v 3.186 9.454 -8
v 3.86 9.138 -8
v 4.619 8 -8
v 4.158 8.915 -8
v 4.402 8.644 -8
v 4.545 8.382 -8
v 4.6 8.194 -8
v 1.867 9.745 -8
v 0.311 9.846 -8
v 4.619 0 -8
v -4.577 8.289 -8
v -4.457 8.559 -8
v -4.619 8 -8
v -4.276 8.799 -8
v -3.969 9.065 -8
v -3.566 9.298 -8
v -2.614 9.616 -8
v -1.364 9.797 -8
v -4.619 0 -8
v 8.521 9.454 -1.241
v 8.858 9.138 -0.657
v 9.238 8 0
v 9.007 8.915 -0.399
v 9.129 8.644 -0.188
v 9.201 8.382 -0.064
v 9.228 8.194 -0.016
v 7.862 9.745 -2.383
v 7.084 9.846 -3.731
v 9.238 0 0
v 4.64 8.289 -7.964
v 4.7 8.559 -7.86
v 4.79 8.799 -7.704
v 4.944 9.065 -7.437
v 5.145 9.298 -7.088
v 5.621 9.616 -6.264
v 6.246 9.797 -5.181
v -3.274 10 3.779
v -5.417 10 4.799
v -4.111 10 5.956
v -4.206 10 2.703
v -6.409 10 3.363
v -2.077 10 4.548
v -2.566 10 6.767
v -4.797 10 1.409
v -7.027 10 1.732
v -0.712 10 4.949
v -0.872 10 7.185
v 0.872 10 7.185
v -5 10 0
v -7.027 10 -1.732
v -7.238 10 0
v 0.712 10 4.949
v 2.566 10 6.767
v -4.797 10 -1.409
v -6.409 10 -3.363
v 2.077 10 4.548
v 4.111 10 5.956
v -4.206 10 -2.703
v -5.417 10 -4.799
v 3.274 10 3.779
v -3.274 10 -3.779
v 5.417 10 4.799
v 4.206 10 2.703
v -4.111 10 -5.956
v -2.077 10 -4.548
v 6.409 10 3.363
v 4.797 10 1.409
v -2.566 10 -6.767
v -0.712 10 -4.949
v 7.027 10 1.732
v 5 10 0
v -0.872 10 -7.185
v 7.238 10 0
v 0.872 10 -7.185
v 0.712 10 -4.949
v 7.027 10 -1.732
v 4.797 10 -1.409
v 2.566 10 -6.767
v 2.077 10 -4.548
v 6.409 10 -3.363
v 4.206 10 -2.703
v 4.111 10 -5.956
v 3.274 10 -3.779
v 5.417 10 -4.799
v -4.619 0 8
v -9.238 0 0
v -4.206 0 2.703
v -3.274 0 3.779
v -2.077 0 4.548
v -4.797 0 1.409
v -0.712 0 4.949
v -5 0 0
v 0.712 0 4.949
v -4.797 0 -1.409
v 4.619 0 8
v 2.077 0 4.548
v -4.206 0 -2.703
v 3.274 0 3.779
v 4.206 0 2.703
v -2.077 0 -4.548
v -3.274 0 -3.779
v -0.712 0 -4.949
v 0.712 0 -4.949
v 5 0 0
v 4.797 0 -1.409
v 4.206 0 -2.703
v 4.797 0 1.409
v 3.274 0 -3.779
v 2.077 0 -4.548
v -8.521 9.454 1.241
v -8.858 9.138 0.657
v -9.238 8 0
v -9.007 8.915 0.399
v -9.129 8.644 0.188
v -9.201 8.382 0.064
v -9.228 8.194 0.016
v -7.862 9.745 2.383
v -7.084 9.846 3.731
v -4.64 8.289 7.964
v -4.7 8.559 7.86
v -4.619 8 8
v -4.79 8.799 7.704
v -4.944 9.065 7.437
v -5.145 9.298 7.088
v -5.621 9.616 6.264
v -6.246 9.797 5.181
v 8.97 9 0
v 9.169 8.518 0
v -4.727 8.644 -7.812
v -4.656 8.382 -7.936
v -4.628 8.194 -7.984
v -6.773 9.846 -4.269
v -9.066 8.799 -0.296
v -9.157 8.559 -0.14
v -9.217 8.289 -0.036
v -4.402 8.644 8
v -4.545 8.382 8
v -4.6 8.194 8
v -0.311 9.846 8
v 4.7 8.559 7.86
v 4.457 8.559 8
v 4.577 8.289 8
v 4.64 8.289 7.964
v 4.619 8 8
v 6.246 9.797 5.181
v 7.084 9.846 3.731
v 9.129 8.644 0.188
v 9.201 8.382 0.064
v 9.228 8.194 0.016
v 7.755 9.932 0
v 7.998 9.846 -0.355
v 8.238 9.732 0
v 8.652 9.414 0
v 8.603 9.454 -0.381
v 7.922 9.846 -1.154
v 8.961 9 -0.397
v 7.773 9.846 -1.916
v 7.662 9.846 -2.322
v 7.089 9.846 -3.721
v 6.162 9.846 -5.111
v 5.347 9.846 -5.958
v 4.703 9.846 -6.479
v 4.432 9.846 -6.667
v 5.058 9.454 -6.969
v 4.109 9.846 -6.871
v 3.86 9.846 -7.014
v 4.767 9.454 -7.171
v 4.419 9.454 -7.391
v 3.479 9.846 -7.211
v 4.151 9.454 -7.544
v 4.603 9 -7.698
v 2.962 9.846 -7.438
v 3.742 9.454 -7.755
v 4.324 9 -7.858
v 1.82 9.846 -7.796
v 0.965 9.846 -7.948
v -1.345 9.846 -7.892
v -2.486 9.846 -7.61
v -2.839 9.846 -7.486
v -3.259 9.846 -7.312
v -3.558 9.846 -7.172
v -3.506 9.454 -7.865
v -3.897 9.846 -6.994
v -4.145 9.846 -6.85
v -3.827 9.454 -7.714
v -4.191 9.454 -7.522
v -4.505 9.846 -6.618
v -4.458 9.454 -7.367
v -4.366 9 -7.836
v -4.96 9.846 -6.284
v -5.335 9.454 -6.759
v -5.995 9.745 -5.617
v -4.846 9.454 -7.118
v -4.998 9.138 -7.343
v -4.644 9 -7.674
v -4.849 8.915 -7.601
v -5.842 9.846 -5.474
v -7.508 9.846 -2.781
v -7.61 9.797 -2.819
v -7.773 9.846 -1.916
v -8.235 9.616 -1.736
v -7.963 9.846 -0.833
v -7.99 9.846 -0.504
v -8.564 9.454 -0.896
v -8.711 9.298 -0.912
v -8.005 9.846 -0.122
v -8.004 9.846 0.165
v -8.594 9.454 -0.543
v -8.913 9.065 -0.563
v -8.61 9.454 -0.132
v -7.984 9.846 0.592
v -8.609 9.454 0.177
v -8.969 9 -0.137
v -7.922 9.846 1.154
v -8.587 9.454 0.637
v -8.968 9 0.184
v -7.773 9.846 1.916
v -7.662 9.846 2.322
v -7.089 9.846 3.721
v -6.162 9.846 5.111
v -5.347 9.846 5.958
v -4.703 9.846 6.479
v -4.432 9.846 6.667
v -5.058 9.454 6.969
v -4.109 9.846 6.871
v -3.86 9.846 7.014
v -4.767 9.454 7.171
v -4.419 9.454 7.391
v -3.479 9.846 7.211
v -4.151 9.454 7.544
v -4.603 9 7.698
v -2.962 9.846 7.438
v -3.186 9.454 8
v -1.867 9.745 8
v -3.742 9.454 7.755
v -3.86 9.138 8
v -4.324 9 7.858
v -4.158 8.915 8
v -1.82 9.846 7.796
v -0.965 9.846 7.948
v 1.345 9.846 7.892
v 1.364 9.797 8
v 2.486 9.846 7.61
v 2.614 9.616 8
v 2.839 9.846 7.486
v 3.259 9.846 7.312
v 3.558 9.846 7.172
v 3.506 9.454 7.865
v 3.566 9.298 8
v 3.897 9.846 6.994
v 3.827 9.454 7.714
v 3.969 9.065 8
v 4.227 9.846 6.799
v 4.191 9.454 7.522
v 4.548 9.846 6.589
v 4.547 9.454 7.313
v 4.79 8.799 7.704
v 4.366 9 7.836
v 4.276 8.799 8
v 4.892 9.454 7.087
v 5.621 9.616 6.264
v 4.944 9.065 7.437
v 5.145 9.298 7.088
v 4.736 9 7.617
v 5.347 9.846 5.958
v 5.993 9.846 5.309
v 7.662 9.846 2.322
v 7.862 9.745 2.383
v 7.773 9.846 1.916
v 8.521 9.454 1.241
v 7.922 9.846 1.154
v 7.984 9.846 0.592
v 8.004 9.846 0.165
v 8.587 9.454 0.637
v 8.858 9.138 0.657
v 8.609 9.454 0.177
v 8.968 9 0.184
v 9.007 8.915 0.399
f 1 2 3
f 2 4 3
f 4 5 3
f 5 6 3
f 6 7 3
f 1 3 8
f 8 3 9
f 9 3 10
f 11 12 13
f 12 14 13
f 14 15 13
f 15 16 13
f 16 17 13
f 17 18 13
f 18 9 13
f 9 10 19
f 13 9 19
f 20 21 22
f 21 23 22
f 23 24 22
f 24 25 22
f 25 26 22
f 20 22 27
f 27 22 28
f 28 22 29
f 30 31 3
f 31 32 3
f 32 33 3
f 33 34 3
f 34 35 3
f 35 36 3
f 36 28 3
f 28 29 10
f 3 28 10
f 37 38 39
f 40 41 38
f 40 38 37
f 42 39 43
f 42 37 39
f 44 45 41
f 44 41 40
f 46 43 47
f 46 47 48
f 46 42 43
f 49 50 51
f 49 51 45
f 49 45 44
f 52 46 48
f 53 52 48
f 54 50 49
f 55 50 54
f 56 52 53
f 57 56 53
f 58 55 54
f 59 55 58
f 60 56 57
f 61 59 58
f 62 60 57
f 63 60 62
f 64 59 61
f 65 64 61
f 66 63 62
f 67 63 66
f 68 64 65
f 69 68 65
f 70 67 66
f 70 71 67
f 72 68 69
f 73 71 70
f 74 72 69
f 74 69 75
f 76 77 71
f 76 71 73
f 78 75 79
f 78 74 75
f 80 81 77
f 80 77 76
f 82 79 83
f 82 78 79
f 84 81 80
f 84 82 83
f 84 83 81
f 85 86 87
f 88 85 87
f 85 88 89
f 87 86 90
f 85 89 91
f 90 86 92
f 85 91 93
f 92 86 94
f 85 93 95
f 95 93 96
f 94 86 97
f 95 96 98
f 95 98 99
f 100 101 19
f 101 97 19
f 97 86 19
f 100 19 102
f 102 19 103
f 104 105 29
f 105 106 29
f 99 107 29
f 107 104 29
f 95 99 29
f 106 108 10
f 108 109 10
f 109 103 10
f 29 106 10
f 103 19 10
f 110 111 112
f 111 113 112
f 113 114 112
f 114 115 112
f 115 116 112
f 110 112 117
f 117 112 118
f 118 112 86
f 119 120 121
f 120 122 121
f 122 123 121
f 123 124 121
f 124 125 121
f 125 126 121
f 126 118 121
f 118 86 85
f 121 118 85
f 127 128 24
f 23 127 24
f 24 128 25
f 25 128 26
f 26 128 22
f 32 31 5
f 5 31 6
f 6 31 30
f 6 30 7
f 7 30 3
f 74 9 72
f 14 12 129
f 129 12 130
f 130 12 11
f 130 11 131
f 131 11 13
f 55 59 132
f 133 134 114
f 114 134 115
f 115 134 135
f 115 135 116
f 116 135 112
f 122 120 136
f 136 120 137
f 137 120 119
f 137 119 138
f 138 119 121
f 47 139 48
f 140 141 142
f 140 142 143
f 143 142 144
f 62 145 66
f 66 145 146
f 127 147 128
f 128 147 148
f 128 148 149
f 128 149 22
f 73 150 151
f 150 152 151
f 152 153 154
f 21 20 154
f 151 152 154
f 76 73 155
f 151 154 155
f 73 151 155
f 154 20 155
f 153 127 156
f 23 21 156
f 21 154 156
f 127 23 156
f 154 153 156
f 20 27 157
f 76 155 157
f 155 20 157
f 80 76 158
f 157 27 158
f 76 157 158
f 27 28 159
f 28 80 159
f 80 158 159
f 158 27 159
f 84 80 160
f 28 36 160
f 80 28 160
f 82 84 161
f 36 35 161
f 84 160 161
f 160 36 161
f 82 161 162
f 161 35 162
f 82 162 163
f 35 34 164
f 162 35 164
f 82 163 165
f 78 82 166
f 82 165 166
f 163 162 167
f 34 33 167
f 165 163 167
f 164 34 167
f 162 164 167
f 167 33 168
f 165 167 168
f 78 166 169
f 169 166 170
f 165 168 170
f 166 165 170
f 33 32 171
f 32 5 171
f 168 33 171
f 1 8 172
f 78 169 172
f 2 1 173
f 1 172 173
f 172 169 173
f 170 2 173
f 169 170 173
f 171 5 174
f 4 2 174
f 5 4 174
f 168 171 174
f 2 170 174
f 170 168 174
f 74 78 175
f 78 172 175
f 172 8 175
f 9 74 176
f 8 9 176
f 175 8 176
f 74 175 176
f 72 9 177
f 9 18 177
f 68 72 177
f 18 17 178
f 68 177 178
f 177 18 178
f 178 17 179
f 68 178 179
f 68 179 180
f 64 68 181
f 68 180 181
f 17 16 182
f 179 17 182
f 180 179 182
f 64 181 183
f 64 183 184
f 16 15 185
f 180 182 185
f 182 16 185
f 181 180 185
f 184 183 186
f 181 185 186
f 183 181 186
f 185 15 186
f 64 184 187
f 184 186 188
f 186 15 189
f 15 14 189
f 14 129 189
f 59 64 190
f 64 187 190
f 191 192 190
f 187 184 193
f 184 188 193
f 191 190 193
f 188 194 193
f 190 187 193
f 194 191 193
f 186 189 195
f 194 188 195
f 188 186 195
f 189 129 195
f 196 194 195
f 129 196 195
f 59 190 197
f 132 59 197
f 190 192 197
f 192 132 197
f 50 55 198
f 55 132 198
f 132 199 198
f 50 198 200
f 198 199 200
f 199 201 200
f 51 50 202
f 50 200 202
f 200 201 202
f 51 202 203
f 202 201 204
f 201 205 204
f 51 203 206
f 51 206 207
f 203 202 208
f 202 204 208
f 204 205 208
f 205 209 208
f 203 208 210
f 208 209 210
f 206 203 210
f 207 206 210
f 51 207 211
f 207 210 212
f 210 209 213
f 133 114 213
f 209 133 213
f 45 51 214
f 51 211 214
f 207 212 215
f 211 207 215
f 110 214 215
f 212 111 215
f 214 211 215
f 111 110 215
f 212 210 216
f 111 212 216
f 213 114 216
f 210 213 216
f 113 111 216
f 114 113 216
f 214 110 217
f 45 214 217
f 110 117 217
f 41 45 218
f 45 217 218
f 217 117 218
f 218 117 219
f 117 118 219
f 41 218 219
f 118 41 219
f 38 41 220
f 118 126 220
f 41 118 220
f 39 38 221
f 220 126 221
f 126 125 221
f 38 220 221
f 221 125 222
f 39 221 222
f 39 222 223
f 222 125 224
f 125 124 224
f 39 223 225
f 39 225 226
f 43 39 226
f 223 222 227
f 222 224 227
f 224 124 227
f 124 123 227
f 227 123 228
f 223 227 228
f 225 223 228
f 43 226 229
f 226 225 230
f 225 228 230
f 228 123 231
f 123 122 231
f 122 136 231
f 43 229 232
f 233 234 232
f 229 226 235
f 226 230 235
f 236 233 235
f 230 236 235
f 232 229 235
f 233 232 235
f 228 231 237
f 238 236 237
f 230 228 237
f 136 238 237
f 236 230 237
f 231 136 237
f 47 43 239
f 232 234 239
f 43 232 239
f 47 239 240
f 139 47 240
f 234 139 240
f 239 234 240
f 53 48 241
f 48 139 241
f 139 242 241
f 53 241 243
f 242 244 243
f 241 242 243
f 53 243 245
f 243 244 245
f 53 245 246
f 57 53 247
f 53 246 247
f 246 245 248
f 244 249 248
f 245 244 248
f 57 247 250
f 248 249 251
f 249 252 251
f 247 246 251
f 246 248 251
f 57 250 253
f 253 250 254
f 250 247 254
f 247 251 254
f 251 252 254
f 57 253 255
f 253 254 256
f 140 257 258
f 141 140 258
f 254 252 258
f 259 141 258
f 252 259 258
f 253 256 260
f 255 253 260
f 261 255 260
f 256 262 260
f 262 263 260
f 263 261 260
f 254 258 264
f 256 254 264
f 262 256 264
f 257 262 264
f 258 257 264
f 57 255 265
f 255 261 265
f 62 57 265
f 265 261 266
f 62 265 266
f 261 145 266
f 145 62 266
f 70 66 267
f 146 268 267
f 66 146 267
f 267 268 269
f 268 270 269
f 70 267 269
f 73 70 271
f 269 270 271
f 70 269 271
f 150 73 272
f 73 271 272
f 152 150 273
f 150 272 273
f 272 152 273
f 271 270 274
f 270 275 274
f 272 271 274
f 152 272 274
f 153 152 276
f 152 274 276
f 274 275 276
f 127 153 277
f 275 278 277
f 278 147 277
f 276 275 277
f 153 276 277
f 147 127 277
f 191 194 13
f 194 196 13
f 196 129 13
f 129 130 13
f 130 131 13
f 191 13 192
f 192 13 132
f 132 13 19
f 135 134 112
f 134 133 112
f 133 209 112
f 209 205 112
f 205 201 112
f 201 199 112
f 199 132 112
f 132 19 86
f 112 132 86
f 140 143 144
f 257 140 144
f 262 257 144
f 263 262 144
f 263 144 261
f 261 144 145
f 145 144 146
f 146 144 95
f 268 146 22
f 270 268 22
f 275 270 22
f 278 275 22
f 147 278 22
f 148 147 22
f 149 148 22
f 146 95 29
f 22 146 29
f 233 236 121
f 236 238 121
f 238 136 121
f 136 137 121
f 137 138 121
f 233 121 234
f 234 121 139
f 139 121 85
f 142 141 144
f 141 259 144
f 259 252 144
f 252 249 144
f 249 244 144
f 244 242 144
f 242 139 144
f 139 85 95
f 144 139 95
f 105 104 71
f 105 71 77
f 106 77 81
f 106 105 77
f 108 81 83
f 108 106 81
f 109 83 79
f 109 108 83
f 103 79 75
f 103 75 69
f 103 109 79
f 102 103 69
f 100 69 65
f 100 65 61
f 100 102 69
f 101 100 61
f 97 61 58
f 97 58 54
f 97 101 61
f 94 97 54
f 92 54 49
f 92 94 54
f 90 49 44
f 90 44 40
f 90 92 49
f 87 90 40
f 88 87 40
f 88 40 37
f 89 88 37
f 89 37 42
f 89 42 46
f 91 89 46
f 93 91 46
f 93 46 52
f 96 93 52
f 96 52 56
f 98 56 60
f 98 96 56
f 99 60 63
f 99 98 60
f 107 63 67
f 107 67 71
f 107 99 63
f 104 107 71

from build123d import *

# Parameters (mm, degrees)
SKETCH1_R           = 5
BOSS_EXTRUDE1_DEPTH = 10


with BuildPart() as part:
    # Sketch1 → Boss-Extrude1 (new body)
    with BuildSketch(Plane(origin=(0, 0, 0), x_dir=(1, 0, 0), z_dir=(0, 1, 0))):
        Polygon((9.237604307, 0), (4.618802154, 8), (-4.618802154, 8), (-9.237604307, 0), (-4.618802154, -8), (4.618802154, -8), align=None)
        Circle(SKETCH1_R, mode=Mode.SUBTRACT)
    extrude(amount=BOSS_EXTRUDE1_DEPTH)

    # Sketch2 → Cut-Revolve1 (revolve, cut)
    with BuildSketch(Plane.XY):
        with BuildLine():
            Line((9.237604307, 10), (7.237604307, 10))
            ThreePointArc((7.237604307, 10), (8.651817869, 9.414213562), (9.237604307, 8))
            Line((9.237604307, 8), (9.237604307, 10))
        make_face()
    revolve(axis=Axis((0, 0, 0), (0, 1, 0)), mode=Mode.SUBTRACT)


solid = part.part
